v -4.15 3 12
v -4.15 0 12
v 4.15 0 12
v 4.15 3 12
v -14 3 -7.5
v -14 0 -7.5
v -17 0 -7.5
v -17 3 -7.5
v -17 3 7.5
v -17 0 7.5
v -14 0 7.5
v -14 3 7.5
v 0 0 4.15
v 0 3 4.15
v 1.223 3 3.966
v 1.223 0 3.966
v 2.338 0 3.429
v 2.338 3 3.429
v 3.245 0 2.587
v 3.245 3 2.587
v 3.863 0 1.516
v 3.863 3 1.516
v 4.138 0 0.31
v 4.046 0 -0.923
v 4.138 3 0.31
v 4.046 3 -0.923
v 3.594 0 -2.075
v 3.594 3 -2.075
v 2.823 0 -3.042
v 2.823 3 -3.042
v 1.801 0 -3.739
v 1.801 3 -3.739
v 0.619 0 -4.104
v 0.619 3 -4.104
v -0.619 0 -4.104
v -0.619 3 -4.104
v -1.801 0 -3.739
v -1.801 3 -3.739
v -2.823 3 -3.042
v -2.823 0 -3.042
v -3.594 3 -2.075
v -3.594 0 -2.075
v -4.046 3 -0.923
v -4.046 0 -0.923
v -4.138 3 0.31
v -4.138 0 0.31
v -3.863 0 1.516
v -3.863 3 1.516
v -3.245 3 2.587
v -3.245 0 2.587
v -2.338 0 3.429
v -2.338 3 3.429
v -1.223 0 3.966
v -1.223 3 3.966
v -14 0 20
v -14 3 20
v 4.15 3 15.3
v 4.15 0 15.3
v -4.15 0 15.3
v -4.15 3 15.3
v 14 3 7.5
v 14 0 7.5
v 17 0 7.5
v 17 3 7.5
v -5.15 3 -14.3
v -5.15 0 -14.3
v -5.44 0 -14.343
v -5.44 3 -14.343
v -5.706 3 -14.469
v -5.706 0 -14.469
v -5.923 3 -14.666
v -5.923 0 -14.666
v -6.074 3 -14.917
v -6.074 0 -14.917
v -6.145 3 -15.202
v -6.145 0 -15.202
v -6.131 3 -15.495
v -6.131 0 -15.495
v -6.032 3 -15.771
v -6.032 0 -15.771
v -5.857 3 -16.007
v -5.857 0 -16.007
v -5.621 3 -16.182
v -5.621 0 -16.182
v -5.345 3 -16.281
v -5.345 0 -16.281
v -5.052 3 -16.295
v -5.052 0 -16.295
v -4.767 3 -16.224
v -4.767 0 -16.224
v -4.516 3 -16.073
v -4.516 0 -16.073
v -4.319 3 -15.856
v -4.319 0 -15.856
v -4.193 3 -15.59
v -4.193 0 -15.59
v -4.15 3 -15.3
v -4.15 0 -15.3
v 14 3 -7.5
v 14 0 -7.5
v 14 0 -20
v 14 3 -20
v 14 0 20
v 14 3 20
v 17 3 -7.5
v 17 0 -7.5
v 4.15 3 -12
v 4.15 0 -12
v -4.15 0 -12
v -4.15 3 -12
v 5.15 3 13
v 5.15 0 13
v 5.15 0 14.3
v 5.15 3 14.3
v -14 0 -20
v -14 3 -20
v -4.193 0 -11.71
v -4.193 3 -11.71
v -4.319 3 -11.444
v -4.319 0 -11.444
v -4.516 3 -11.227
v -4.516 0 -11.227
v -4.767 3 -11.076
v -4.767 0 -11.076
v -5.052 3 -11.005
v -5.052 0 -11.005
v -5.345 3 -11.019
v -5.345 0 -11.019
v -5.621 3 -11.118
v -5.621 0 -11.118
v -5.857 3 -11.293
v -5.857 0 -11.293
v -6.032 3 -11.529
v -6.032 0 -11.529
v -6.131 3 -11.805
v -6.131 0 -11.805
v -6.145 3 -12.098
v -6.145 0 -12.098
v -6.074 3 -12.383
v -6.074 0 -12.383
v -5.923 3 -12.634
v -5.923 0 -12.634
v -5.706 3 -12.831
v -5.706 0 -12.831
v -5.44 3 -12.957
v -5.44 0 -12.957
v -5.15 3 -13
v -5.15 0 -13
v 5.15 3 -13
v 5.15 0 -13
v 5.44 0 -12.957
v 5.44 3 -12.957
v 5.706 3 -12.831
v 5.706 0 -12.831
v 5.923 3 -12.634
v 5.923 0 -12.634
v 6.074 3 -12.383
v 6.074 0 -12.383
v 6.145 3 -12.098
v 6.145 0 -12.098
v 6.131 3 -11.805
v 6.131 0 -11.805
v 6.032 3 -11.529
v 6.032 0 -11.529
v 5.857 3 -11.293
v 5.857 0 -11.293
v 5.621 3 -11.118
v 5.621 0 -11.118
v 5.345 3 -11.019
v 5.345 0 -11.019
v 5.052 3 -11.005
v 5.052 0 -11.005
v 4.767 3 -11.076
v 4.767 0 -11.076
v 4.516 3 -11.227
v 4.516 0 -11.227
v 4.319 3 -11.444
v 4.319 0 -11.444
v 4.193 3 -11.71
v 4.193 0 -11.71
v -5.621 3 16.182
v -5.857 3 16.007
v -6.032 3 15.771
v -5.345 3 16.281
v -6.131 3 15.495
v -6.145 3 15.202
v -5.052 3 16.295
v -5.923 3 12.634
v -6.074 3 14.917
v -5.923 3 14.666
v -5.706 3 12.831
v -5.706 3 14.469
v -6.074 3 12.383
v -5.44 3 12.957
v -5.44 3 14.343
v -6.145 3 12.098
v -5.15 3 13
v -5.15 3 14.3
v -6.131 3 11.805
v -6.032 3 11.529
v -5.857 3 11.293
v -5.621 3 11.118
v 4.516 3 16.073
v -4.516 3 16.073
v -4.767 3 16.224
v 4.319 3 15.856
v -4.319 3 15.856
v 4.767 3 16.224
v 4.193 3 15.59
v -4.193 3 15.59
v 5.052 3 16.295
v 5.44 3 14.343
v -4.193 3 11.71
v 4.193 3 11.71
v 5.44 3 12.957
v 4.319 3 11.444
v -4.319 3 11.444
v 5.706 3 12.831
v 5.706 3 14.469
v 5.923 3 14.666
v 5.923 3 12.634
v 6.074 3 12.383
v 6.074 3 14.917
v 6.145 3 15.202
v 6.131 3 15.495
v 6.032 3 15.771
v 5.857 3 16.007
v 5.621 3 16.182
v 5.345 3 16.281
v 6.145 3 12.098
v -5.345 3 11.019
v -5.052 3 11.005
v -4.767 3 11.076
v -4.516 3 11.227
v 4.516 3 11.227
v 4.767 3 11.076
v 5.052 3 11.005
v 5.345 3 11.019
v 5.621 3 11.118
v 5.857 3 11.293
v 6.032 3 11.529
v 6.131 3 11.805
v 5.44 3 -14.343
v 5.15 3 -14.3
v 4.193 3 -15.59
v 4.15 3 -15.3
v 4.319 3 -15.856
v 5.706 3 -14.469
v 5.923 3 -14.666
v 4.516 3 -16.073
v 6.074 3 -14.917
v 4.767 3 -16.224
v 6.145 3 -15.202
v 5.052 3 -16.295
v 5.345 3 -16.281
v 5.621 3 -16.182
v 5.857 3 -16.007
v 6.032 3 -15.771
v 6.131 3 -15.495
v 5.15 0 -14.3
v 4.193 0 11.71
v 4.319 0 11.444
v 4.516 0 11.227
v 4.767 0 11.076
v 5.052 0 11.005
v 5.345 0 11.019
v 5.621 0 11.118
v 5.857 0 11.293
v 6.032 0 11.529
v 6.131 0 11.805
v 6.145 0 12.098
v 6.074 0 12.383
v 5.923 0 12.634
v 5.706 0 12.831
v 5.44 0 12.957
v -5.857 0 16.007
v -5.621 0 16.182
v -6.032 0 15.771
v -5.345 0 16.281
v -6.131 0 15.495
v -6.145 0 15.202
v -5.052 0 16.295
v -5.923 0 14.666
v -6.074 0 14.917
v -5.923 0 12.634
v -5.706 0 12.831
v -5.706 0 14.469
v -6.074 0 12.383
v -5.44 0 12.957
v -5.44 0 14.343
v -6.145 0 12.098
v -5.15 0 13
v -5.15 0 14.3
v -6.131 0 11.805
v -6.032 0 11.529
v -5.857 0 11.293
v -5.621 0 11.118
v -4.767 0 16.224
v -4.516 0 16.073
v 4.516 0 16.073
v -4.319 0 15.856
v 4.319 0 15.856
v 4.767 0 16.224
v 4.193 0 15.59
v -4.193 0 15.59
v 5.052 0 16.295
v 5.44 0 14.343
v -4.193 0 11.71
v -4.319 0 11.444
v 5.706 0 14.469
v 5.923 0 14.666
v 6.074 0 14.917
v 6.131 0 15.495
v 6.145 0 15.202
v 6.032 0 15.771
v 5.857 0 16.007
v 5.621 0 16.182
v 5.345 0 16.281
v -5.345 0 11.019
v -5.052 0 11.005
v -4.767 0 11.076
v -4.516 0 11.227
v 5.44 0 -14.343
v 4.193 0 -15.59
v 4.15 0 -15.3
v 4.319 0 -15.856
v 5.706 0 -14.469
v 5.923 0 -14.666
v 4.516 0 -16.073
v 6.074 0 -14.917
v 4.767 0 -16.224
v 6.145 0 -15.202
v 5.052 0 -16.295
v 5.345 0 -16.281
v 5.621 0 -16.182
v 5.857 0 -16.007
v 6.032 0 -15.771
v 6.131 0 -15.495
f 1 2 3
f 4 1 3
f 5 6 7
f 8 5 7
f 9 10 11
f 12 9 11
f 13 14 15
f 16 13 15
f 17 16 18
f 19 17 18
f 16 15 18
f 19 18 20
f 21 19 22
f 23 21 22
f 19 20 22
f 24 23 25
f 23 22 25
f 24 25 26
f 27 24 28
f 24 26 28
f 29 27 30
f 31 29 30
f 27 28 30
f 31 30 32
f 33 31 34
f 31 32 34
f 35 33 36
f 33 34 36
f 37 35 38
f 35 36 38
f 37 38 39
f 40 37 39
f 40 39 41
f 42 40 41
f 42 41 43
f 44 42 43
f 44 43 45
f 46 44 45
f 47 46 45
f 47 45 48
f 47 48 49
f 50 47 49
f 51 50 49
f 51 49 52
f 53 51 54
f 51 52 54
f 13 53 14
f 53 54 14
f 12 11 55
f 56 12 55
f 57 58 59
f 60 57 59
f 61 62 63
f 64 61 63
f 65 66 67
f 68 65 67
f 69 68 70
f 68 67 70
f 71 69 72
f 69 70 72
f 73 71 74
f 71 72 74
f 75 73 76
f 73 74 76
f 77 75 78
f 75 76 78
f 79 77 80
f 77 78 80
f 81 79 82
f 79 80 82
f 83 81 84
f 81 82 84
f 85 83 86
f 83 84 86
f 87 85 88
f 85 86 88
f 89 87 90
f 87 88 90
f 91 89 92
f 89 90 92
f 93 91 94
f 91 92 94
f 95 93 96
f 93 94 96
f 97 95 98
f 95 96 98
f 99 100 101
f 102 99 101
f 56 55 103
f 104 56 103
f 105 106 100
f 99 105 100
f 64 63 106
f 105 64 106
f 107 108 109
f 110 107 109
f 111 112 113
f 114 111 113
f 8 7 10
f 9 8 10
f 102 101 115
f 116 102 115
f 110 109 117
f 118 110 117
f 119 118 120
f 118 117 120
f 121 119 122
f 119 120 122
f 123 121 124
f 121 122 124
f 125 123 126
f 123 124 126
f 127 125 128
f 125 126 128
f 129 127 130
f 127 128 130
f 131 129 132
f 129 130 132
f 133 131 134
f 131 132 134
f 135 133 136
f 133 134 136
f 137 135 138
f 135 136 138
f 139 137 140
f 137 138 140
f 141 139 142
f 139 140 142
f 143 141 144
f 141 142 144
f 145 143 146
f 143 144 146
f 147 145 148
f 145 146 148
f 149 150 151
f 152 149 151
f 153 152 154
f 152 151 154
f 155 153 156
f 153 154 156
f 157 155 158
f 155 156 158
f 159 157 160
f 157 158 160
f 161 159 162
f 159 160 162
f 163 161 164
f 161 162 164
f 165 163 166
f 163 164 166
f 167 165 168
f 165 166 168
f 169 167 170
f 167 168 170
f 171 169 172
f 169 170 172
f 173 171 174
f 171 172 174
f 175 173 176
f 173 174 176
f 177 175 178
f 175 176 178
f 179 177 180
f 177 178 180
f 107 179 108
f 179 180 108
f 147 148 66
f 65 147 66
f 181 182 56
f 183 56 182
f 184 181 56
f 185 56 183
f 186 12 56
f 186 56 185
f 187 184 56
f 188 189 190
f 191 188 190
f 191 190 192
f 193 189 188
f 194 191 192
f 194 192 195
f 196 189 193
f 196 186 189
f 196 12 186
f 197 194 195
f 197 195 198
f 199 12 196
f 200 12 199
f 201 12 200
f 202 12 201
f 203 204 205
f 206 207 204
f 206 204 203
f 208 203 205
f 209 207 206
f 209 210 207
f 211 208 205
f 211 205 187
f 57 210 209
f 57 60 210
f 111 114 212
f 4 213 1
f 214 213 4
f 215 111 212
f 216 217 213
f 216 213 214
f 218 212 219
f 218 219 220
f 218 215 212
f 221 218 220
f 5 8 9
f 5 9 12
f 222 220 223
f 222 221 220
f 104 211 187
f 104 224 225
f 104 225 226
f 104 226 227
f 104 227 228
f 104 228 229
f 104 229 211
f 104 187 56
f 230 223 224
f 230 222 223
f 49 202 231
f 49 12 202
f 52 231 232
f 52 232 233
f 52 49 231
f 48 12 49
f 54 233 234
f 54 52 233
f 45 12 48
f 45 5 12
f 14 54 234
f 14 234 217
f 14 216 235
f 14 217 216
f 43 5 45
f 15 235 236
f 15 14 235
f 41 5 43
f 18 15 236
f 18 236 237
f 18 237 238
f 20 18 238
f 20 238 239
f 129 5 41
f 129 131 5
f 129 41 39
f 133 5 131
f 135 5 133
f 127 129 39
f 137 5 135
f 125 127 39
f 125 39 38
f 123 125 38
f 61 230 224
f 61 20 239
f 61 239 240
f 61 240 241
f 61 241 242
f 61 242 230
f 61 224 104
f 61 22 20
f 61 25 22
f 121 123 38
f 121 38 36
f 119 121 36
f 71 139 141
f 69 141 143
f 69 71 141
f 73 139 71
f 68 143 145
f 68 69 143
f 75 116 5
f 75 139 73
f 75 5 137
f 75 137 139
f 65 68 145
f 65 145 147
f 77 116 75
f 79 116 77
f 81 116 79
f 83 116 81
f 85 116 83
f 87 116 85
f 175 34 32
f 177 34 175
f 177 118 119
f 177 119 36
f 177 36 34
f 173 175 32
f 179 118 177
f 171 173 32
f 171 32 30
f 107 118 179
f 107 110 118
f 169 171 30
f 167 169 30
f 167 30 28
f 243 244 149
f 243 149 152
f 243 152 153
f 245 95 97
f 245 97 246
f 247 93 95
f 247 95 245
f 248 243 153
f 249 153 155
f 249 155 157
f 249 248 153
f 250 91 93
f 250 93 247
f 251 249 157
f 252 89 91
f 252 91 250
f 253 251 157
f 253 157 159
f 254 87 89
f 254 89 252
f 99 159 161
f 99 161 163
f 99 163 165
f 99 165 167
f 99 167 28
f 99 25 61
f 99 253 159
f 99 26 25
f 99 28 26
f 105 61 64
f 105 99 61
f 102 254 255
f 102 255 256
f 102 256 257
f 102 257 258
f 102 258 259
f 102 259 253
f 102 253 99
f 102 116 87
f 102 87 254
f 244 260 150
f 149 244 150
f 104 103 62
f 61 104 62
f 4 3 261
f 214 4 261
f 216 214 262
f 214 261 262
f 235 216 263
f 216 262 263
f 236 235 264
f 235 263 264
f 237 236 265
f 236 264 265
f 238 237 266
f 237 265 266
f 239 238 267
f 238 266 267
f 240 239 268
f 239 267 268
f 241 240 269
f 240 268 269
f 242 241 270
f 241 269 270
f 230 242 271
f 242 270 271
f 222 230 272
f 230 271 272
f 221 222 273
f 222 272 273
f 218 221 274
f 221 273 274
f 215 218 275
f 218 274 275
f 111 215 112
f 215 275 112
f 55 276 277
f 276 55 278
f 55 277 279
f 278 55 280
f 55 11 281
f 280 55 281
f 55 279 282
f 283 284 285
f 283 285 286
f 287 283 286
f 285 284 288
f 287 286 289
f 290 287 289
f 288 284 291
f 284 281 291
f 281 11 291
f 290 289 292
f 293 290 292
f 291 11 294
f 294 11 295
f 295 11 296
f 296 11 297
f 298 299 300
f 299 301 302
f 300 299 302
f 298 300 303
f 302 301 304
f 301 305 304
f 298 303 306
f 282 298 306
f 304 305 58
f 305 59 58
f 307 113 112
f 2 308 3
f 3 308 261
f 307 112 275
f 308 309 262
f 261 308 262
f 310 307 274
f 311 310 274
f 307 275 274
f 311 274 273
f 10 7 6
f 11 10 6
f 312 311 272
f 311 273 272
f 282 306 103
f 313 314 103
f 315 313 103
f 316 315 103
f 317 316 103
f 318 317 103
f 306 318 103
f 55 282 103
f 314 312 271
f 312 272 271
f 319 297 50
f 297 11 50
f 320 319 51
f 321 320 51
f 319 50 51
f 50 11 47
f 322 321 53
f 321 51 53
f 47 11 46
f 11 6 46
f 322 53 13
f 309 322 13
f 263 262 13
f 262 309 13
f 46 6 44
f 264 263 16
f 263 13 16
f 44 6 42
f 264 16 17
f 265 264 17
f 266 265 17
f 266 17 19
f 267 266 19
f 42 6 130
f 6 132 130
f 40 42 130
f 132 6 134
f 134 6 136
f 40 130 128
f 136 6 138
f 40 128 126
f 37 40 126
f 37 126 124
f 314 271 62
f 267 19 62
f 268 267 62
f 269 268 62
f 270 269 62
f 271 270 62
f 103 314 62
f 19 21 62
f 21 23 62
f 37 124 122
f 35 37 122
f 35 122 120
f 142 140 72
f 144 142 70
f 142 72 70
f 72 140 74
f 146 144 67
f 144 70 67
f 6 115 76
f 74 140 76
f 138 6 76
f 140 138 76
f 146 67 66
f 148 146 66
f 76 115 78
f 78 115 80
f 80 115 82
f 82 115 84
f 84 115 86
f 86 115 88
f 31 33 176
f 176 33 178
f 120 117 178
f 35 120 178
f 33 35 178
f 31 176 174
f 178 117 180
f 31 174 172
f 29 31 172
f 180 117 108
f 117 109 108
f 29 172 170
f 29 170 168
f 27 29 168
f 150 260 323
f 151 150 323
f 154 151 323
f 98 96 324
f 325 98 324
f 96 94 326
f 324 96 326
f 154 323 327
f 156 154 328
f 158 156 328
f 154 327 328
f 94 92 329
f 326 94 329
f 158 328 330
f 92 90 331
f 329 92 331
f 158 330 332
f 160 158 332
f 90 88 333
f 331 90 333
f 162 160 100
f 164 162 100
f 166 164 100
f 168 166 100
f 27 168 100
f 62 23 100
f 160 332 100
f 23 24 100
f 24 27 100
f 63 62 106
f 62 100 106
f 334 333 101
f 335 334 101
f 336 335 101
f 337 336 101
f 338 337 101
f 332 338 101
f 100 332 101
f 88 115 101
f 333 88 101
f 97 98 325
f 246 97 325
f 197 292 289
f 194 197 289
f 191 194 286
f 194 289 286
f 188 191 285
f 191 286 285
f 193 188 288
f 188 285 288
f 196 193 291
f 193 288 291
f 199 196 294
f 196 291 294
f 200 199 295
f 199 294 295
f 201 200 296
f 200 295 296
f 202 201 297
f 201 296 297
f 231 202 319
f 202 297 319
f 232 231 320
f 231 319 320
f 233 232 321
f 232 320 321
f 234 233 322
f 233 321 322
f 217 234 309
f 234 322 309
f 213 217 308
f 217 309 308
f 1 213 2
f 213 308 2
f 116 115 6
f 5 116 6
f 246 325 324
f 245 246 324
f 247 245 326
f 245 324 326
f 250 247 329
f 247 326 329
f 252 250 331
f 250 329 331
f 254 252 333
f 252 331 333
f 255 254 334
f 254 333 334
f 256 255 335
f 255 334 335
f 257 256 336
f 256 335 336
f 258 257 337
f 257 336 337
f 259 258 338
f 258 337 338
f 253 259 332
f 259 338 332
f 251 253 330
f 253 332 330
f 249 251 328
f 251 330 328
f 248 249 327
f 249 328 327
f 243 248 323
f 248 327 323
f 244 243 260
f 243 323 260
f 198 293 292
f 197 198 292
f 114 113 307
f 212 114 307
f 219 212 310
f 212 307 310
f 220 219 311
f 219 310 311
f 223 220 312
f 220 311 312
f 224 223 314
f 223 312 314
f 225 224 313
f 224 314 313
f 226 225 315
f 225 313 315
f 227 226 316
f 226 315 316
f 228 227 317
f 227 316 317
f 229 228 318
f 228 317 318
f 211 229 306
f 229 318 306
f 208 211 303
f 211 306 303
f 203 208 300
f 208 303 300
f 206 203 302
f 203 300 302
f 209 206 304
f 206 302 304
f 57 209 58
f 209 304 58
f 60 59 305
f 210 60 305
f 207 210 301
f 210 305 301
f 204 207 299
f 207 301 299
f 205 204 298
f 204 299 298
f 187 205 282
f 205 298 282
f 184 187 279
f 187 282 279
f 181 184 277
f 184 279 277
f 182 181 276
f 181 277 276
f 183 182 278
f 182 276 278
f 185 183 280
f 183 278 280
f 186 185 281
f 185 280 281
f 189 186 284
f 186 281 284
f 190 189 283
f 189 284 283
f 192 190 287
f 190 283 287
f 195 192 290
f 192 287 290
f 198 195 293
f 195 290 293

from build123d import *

# Parameters (mm, degrees)
EXTRUDE_1_DEPTH     = 3
SKETCH_3_R          = 4.15
CUT_EXTRUDE_2_DEPTH = 3


with BuildPart() as part:
    # 草图1 → 凸台-拉伸1 (new body)
    with BuildSketch(Plane(origin=(0, 0, 0), x_dir=(1, 0, 0), z_dir=(0, 1, 0))):
        Polygon((14, 20), (-14, 20), (-14, 7.5), (-17, 7.5), (-17, -7.5), (-14, -7.5), (-14, -20), (14, -20), (14, -7.5), (17, -7.5), (17, 7.5), (14, 7.5), align=None)
        with BuildLine():
            ThreePointArc((-5.15, -13), (-5.857106781, -11.292893219), (-4.15, -12))
            Line((-4.15, -12), (4.15, -12))
            ThreePointArc((4.15, -12), (5.857106781, -11.292893219), (5.15, -13))
            Line((5.15, -13), (5.15, -14.3))
            ThreePointArc((5.15, -14.3), (5.857106781, -16.007106781), (4.15, -15.3))
            Line((4.15, -15.3), (-4.15, -15.3))
            ThreePointArc((-4.15, -15.3), (-5.857106781, -16.007106781), (-5.15, -14.3))
            Line((-5.15, -14.3), (-5.15, -13))
        make_face(mode=Mode.SUBTRACT)
        with BuildLine():
            ThreePointArc((-5.15, 14.3), (-5.857106781, 16.007106781), (-4.15, 15.3))
            Line((-4.15, 15.3), (4.15, 15.3))
            ThreePointArc((4.15, 15.3), (5.857106781, 16.007106781), (5.15, 14.3))
            Line((5.15, 14.3), (5.15, 13))
            ThreePointArc((5.15, 13), (5.857106781, 11.292893219), (4.15, 12))
            Line((4.15, 12), (-4.15, 12))
            ThreePointArc((-4.15, 12), (-5.857106781, 11.292893219), (-5.15, 13))
            Line((-5.15, 13), (-5.15, 14.3))
        make_face(mode=Mode.SUBTRACT)
    extrude(amount=EXTRUDE_1_DEPTH)

    # 草图3 → 切除-拉伸2 (cut)
    with BuildSketch(Plane(origin=(0, 3, 0), x_dir=(1, 0, 0), z_dir=(0, 1, 0))):
        with Locations(Location((0, 0, 0), (0, 0, 270))):
            Circle(SKETCH_3_R)
    extrude(amount=-CUT_EXTRUDE_2_DEPTH, mode=Mode.SUBTRACT)


solid = part.part
